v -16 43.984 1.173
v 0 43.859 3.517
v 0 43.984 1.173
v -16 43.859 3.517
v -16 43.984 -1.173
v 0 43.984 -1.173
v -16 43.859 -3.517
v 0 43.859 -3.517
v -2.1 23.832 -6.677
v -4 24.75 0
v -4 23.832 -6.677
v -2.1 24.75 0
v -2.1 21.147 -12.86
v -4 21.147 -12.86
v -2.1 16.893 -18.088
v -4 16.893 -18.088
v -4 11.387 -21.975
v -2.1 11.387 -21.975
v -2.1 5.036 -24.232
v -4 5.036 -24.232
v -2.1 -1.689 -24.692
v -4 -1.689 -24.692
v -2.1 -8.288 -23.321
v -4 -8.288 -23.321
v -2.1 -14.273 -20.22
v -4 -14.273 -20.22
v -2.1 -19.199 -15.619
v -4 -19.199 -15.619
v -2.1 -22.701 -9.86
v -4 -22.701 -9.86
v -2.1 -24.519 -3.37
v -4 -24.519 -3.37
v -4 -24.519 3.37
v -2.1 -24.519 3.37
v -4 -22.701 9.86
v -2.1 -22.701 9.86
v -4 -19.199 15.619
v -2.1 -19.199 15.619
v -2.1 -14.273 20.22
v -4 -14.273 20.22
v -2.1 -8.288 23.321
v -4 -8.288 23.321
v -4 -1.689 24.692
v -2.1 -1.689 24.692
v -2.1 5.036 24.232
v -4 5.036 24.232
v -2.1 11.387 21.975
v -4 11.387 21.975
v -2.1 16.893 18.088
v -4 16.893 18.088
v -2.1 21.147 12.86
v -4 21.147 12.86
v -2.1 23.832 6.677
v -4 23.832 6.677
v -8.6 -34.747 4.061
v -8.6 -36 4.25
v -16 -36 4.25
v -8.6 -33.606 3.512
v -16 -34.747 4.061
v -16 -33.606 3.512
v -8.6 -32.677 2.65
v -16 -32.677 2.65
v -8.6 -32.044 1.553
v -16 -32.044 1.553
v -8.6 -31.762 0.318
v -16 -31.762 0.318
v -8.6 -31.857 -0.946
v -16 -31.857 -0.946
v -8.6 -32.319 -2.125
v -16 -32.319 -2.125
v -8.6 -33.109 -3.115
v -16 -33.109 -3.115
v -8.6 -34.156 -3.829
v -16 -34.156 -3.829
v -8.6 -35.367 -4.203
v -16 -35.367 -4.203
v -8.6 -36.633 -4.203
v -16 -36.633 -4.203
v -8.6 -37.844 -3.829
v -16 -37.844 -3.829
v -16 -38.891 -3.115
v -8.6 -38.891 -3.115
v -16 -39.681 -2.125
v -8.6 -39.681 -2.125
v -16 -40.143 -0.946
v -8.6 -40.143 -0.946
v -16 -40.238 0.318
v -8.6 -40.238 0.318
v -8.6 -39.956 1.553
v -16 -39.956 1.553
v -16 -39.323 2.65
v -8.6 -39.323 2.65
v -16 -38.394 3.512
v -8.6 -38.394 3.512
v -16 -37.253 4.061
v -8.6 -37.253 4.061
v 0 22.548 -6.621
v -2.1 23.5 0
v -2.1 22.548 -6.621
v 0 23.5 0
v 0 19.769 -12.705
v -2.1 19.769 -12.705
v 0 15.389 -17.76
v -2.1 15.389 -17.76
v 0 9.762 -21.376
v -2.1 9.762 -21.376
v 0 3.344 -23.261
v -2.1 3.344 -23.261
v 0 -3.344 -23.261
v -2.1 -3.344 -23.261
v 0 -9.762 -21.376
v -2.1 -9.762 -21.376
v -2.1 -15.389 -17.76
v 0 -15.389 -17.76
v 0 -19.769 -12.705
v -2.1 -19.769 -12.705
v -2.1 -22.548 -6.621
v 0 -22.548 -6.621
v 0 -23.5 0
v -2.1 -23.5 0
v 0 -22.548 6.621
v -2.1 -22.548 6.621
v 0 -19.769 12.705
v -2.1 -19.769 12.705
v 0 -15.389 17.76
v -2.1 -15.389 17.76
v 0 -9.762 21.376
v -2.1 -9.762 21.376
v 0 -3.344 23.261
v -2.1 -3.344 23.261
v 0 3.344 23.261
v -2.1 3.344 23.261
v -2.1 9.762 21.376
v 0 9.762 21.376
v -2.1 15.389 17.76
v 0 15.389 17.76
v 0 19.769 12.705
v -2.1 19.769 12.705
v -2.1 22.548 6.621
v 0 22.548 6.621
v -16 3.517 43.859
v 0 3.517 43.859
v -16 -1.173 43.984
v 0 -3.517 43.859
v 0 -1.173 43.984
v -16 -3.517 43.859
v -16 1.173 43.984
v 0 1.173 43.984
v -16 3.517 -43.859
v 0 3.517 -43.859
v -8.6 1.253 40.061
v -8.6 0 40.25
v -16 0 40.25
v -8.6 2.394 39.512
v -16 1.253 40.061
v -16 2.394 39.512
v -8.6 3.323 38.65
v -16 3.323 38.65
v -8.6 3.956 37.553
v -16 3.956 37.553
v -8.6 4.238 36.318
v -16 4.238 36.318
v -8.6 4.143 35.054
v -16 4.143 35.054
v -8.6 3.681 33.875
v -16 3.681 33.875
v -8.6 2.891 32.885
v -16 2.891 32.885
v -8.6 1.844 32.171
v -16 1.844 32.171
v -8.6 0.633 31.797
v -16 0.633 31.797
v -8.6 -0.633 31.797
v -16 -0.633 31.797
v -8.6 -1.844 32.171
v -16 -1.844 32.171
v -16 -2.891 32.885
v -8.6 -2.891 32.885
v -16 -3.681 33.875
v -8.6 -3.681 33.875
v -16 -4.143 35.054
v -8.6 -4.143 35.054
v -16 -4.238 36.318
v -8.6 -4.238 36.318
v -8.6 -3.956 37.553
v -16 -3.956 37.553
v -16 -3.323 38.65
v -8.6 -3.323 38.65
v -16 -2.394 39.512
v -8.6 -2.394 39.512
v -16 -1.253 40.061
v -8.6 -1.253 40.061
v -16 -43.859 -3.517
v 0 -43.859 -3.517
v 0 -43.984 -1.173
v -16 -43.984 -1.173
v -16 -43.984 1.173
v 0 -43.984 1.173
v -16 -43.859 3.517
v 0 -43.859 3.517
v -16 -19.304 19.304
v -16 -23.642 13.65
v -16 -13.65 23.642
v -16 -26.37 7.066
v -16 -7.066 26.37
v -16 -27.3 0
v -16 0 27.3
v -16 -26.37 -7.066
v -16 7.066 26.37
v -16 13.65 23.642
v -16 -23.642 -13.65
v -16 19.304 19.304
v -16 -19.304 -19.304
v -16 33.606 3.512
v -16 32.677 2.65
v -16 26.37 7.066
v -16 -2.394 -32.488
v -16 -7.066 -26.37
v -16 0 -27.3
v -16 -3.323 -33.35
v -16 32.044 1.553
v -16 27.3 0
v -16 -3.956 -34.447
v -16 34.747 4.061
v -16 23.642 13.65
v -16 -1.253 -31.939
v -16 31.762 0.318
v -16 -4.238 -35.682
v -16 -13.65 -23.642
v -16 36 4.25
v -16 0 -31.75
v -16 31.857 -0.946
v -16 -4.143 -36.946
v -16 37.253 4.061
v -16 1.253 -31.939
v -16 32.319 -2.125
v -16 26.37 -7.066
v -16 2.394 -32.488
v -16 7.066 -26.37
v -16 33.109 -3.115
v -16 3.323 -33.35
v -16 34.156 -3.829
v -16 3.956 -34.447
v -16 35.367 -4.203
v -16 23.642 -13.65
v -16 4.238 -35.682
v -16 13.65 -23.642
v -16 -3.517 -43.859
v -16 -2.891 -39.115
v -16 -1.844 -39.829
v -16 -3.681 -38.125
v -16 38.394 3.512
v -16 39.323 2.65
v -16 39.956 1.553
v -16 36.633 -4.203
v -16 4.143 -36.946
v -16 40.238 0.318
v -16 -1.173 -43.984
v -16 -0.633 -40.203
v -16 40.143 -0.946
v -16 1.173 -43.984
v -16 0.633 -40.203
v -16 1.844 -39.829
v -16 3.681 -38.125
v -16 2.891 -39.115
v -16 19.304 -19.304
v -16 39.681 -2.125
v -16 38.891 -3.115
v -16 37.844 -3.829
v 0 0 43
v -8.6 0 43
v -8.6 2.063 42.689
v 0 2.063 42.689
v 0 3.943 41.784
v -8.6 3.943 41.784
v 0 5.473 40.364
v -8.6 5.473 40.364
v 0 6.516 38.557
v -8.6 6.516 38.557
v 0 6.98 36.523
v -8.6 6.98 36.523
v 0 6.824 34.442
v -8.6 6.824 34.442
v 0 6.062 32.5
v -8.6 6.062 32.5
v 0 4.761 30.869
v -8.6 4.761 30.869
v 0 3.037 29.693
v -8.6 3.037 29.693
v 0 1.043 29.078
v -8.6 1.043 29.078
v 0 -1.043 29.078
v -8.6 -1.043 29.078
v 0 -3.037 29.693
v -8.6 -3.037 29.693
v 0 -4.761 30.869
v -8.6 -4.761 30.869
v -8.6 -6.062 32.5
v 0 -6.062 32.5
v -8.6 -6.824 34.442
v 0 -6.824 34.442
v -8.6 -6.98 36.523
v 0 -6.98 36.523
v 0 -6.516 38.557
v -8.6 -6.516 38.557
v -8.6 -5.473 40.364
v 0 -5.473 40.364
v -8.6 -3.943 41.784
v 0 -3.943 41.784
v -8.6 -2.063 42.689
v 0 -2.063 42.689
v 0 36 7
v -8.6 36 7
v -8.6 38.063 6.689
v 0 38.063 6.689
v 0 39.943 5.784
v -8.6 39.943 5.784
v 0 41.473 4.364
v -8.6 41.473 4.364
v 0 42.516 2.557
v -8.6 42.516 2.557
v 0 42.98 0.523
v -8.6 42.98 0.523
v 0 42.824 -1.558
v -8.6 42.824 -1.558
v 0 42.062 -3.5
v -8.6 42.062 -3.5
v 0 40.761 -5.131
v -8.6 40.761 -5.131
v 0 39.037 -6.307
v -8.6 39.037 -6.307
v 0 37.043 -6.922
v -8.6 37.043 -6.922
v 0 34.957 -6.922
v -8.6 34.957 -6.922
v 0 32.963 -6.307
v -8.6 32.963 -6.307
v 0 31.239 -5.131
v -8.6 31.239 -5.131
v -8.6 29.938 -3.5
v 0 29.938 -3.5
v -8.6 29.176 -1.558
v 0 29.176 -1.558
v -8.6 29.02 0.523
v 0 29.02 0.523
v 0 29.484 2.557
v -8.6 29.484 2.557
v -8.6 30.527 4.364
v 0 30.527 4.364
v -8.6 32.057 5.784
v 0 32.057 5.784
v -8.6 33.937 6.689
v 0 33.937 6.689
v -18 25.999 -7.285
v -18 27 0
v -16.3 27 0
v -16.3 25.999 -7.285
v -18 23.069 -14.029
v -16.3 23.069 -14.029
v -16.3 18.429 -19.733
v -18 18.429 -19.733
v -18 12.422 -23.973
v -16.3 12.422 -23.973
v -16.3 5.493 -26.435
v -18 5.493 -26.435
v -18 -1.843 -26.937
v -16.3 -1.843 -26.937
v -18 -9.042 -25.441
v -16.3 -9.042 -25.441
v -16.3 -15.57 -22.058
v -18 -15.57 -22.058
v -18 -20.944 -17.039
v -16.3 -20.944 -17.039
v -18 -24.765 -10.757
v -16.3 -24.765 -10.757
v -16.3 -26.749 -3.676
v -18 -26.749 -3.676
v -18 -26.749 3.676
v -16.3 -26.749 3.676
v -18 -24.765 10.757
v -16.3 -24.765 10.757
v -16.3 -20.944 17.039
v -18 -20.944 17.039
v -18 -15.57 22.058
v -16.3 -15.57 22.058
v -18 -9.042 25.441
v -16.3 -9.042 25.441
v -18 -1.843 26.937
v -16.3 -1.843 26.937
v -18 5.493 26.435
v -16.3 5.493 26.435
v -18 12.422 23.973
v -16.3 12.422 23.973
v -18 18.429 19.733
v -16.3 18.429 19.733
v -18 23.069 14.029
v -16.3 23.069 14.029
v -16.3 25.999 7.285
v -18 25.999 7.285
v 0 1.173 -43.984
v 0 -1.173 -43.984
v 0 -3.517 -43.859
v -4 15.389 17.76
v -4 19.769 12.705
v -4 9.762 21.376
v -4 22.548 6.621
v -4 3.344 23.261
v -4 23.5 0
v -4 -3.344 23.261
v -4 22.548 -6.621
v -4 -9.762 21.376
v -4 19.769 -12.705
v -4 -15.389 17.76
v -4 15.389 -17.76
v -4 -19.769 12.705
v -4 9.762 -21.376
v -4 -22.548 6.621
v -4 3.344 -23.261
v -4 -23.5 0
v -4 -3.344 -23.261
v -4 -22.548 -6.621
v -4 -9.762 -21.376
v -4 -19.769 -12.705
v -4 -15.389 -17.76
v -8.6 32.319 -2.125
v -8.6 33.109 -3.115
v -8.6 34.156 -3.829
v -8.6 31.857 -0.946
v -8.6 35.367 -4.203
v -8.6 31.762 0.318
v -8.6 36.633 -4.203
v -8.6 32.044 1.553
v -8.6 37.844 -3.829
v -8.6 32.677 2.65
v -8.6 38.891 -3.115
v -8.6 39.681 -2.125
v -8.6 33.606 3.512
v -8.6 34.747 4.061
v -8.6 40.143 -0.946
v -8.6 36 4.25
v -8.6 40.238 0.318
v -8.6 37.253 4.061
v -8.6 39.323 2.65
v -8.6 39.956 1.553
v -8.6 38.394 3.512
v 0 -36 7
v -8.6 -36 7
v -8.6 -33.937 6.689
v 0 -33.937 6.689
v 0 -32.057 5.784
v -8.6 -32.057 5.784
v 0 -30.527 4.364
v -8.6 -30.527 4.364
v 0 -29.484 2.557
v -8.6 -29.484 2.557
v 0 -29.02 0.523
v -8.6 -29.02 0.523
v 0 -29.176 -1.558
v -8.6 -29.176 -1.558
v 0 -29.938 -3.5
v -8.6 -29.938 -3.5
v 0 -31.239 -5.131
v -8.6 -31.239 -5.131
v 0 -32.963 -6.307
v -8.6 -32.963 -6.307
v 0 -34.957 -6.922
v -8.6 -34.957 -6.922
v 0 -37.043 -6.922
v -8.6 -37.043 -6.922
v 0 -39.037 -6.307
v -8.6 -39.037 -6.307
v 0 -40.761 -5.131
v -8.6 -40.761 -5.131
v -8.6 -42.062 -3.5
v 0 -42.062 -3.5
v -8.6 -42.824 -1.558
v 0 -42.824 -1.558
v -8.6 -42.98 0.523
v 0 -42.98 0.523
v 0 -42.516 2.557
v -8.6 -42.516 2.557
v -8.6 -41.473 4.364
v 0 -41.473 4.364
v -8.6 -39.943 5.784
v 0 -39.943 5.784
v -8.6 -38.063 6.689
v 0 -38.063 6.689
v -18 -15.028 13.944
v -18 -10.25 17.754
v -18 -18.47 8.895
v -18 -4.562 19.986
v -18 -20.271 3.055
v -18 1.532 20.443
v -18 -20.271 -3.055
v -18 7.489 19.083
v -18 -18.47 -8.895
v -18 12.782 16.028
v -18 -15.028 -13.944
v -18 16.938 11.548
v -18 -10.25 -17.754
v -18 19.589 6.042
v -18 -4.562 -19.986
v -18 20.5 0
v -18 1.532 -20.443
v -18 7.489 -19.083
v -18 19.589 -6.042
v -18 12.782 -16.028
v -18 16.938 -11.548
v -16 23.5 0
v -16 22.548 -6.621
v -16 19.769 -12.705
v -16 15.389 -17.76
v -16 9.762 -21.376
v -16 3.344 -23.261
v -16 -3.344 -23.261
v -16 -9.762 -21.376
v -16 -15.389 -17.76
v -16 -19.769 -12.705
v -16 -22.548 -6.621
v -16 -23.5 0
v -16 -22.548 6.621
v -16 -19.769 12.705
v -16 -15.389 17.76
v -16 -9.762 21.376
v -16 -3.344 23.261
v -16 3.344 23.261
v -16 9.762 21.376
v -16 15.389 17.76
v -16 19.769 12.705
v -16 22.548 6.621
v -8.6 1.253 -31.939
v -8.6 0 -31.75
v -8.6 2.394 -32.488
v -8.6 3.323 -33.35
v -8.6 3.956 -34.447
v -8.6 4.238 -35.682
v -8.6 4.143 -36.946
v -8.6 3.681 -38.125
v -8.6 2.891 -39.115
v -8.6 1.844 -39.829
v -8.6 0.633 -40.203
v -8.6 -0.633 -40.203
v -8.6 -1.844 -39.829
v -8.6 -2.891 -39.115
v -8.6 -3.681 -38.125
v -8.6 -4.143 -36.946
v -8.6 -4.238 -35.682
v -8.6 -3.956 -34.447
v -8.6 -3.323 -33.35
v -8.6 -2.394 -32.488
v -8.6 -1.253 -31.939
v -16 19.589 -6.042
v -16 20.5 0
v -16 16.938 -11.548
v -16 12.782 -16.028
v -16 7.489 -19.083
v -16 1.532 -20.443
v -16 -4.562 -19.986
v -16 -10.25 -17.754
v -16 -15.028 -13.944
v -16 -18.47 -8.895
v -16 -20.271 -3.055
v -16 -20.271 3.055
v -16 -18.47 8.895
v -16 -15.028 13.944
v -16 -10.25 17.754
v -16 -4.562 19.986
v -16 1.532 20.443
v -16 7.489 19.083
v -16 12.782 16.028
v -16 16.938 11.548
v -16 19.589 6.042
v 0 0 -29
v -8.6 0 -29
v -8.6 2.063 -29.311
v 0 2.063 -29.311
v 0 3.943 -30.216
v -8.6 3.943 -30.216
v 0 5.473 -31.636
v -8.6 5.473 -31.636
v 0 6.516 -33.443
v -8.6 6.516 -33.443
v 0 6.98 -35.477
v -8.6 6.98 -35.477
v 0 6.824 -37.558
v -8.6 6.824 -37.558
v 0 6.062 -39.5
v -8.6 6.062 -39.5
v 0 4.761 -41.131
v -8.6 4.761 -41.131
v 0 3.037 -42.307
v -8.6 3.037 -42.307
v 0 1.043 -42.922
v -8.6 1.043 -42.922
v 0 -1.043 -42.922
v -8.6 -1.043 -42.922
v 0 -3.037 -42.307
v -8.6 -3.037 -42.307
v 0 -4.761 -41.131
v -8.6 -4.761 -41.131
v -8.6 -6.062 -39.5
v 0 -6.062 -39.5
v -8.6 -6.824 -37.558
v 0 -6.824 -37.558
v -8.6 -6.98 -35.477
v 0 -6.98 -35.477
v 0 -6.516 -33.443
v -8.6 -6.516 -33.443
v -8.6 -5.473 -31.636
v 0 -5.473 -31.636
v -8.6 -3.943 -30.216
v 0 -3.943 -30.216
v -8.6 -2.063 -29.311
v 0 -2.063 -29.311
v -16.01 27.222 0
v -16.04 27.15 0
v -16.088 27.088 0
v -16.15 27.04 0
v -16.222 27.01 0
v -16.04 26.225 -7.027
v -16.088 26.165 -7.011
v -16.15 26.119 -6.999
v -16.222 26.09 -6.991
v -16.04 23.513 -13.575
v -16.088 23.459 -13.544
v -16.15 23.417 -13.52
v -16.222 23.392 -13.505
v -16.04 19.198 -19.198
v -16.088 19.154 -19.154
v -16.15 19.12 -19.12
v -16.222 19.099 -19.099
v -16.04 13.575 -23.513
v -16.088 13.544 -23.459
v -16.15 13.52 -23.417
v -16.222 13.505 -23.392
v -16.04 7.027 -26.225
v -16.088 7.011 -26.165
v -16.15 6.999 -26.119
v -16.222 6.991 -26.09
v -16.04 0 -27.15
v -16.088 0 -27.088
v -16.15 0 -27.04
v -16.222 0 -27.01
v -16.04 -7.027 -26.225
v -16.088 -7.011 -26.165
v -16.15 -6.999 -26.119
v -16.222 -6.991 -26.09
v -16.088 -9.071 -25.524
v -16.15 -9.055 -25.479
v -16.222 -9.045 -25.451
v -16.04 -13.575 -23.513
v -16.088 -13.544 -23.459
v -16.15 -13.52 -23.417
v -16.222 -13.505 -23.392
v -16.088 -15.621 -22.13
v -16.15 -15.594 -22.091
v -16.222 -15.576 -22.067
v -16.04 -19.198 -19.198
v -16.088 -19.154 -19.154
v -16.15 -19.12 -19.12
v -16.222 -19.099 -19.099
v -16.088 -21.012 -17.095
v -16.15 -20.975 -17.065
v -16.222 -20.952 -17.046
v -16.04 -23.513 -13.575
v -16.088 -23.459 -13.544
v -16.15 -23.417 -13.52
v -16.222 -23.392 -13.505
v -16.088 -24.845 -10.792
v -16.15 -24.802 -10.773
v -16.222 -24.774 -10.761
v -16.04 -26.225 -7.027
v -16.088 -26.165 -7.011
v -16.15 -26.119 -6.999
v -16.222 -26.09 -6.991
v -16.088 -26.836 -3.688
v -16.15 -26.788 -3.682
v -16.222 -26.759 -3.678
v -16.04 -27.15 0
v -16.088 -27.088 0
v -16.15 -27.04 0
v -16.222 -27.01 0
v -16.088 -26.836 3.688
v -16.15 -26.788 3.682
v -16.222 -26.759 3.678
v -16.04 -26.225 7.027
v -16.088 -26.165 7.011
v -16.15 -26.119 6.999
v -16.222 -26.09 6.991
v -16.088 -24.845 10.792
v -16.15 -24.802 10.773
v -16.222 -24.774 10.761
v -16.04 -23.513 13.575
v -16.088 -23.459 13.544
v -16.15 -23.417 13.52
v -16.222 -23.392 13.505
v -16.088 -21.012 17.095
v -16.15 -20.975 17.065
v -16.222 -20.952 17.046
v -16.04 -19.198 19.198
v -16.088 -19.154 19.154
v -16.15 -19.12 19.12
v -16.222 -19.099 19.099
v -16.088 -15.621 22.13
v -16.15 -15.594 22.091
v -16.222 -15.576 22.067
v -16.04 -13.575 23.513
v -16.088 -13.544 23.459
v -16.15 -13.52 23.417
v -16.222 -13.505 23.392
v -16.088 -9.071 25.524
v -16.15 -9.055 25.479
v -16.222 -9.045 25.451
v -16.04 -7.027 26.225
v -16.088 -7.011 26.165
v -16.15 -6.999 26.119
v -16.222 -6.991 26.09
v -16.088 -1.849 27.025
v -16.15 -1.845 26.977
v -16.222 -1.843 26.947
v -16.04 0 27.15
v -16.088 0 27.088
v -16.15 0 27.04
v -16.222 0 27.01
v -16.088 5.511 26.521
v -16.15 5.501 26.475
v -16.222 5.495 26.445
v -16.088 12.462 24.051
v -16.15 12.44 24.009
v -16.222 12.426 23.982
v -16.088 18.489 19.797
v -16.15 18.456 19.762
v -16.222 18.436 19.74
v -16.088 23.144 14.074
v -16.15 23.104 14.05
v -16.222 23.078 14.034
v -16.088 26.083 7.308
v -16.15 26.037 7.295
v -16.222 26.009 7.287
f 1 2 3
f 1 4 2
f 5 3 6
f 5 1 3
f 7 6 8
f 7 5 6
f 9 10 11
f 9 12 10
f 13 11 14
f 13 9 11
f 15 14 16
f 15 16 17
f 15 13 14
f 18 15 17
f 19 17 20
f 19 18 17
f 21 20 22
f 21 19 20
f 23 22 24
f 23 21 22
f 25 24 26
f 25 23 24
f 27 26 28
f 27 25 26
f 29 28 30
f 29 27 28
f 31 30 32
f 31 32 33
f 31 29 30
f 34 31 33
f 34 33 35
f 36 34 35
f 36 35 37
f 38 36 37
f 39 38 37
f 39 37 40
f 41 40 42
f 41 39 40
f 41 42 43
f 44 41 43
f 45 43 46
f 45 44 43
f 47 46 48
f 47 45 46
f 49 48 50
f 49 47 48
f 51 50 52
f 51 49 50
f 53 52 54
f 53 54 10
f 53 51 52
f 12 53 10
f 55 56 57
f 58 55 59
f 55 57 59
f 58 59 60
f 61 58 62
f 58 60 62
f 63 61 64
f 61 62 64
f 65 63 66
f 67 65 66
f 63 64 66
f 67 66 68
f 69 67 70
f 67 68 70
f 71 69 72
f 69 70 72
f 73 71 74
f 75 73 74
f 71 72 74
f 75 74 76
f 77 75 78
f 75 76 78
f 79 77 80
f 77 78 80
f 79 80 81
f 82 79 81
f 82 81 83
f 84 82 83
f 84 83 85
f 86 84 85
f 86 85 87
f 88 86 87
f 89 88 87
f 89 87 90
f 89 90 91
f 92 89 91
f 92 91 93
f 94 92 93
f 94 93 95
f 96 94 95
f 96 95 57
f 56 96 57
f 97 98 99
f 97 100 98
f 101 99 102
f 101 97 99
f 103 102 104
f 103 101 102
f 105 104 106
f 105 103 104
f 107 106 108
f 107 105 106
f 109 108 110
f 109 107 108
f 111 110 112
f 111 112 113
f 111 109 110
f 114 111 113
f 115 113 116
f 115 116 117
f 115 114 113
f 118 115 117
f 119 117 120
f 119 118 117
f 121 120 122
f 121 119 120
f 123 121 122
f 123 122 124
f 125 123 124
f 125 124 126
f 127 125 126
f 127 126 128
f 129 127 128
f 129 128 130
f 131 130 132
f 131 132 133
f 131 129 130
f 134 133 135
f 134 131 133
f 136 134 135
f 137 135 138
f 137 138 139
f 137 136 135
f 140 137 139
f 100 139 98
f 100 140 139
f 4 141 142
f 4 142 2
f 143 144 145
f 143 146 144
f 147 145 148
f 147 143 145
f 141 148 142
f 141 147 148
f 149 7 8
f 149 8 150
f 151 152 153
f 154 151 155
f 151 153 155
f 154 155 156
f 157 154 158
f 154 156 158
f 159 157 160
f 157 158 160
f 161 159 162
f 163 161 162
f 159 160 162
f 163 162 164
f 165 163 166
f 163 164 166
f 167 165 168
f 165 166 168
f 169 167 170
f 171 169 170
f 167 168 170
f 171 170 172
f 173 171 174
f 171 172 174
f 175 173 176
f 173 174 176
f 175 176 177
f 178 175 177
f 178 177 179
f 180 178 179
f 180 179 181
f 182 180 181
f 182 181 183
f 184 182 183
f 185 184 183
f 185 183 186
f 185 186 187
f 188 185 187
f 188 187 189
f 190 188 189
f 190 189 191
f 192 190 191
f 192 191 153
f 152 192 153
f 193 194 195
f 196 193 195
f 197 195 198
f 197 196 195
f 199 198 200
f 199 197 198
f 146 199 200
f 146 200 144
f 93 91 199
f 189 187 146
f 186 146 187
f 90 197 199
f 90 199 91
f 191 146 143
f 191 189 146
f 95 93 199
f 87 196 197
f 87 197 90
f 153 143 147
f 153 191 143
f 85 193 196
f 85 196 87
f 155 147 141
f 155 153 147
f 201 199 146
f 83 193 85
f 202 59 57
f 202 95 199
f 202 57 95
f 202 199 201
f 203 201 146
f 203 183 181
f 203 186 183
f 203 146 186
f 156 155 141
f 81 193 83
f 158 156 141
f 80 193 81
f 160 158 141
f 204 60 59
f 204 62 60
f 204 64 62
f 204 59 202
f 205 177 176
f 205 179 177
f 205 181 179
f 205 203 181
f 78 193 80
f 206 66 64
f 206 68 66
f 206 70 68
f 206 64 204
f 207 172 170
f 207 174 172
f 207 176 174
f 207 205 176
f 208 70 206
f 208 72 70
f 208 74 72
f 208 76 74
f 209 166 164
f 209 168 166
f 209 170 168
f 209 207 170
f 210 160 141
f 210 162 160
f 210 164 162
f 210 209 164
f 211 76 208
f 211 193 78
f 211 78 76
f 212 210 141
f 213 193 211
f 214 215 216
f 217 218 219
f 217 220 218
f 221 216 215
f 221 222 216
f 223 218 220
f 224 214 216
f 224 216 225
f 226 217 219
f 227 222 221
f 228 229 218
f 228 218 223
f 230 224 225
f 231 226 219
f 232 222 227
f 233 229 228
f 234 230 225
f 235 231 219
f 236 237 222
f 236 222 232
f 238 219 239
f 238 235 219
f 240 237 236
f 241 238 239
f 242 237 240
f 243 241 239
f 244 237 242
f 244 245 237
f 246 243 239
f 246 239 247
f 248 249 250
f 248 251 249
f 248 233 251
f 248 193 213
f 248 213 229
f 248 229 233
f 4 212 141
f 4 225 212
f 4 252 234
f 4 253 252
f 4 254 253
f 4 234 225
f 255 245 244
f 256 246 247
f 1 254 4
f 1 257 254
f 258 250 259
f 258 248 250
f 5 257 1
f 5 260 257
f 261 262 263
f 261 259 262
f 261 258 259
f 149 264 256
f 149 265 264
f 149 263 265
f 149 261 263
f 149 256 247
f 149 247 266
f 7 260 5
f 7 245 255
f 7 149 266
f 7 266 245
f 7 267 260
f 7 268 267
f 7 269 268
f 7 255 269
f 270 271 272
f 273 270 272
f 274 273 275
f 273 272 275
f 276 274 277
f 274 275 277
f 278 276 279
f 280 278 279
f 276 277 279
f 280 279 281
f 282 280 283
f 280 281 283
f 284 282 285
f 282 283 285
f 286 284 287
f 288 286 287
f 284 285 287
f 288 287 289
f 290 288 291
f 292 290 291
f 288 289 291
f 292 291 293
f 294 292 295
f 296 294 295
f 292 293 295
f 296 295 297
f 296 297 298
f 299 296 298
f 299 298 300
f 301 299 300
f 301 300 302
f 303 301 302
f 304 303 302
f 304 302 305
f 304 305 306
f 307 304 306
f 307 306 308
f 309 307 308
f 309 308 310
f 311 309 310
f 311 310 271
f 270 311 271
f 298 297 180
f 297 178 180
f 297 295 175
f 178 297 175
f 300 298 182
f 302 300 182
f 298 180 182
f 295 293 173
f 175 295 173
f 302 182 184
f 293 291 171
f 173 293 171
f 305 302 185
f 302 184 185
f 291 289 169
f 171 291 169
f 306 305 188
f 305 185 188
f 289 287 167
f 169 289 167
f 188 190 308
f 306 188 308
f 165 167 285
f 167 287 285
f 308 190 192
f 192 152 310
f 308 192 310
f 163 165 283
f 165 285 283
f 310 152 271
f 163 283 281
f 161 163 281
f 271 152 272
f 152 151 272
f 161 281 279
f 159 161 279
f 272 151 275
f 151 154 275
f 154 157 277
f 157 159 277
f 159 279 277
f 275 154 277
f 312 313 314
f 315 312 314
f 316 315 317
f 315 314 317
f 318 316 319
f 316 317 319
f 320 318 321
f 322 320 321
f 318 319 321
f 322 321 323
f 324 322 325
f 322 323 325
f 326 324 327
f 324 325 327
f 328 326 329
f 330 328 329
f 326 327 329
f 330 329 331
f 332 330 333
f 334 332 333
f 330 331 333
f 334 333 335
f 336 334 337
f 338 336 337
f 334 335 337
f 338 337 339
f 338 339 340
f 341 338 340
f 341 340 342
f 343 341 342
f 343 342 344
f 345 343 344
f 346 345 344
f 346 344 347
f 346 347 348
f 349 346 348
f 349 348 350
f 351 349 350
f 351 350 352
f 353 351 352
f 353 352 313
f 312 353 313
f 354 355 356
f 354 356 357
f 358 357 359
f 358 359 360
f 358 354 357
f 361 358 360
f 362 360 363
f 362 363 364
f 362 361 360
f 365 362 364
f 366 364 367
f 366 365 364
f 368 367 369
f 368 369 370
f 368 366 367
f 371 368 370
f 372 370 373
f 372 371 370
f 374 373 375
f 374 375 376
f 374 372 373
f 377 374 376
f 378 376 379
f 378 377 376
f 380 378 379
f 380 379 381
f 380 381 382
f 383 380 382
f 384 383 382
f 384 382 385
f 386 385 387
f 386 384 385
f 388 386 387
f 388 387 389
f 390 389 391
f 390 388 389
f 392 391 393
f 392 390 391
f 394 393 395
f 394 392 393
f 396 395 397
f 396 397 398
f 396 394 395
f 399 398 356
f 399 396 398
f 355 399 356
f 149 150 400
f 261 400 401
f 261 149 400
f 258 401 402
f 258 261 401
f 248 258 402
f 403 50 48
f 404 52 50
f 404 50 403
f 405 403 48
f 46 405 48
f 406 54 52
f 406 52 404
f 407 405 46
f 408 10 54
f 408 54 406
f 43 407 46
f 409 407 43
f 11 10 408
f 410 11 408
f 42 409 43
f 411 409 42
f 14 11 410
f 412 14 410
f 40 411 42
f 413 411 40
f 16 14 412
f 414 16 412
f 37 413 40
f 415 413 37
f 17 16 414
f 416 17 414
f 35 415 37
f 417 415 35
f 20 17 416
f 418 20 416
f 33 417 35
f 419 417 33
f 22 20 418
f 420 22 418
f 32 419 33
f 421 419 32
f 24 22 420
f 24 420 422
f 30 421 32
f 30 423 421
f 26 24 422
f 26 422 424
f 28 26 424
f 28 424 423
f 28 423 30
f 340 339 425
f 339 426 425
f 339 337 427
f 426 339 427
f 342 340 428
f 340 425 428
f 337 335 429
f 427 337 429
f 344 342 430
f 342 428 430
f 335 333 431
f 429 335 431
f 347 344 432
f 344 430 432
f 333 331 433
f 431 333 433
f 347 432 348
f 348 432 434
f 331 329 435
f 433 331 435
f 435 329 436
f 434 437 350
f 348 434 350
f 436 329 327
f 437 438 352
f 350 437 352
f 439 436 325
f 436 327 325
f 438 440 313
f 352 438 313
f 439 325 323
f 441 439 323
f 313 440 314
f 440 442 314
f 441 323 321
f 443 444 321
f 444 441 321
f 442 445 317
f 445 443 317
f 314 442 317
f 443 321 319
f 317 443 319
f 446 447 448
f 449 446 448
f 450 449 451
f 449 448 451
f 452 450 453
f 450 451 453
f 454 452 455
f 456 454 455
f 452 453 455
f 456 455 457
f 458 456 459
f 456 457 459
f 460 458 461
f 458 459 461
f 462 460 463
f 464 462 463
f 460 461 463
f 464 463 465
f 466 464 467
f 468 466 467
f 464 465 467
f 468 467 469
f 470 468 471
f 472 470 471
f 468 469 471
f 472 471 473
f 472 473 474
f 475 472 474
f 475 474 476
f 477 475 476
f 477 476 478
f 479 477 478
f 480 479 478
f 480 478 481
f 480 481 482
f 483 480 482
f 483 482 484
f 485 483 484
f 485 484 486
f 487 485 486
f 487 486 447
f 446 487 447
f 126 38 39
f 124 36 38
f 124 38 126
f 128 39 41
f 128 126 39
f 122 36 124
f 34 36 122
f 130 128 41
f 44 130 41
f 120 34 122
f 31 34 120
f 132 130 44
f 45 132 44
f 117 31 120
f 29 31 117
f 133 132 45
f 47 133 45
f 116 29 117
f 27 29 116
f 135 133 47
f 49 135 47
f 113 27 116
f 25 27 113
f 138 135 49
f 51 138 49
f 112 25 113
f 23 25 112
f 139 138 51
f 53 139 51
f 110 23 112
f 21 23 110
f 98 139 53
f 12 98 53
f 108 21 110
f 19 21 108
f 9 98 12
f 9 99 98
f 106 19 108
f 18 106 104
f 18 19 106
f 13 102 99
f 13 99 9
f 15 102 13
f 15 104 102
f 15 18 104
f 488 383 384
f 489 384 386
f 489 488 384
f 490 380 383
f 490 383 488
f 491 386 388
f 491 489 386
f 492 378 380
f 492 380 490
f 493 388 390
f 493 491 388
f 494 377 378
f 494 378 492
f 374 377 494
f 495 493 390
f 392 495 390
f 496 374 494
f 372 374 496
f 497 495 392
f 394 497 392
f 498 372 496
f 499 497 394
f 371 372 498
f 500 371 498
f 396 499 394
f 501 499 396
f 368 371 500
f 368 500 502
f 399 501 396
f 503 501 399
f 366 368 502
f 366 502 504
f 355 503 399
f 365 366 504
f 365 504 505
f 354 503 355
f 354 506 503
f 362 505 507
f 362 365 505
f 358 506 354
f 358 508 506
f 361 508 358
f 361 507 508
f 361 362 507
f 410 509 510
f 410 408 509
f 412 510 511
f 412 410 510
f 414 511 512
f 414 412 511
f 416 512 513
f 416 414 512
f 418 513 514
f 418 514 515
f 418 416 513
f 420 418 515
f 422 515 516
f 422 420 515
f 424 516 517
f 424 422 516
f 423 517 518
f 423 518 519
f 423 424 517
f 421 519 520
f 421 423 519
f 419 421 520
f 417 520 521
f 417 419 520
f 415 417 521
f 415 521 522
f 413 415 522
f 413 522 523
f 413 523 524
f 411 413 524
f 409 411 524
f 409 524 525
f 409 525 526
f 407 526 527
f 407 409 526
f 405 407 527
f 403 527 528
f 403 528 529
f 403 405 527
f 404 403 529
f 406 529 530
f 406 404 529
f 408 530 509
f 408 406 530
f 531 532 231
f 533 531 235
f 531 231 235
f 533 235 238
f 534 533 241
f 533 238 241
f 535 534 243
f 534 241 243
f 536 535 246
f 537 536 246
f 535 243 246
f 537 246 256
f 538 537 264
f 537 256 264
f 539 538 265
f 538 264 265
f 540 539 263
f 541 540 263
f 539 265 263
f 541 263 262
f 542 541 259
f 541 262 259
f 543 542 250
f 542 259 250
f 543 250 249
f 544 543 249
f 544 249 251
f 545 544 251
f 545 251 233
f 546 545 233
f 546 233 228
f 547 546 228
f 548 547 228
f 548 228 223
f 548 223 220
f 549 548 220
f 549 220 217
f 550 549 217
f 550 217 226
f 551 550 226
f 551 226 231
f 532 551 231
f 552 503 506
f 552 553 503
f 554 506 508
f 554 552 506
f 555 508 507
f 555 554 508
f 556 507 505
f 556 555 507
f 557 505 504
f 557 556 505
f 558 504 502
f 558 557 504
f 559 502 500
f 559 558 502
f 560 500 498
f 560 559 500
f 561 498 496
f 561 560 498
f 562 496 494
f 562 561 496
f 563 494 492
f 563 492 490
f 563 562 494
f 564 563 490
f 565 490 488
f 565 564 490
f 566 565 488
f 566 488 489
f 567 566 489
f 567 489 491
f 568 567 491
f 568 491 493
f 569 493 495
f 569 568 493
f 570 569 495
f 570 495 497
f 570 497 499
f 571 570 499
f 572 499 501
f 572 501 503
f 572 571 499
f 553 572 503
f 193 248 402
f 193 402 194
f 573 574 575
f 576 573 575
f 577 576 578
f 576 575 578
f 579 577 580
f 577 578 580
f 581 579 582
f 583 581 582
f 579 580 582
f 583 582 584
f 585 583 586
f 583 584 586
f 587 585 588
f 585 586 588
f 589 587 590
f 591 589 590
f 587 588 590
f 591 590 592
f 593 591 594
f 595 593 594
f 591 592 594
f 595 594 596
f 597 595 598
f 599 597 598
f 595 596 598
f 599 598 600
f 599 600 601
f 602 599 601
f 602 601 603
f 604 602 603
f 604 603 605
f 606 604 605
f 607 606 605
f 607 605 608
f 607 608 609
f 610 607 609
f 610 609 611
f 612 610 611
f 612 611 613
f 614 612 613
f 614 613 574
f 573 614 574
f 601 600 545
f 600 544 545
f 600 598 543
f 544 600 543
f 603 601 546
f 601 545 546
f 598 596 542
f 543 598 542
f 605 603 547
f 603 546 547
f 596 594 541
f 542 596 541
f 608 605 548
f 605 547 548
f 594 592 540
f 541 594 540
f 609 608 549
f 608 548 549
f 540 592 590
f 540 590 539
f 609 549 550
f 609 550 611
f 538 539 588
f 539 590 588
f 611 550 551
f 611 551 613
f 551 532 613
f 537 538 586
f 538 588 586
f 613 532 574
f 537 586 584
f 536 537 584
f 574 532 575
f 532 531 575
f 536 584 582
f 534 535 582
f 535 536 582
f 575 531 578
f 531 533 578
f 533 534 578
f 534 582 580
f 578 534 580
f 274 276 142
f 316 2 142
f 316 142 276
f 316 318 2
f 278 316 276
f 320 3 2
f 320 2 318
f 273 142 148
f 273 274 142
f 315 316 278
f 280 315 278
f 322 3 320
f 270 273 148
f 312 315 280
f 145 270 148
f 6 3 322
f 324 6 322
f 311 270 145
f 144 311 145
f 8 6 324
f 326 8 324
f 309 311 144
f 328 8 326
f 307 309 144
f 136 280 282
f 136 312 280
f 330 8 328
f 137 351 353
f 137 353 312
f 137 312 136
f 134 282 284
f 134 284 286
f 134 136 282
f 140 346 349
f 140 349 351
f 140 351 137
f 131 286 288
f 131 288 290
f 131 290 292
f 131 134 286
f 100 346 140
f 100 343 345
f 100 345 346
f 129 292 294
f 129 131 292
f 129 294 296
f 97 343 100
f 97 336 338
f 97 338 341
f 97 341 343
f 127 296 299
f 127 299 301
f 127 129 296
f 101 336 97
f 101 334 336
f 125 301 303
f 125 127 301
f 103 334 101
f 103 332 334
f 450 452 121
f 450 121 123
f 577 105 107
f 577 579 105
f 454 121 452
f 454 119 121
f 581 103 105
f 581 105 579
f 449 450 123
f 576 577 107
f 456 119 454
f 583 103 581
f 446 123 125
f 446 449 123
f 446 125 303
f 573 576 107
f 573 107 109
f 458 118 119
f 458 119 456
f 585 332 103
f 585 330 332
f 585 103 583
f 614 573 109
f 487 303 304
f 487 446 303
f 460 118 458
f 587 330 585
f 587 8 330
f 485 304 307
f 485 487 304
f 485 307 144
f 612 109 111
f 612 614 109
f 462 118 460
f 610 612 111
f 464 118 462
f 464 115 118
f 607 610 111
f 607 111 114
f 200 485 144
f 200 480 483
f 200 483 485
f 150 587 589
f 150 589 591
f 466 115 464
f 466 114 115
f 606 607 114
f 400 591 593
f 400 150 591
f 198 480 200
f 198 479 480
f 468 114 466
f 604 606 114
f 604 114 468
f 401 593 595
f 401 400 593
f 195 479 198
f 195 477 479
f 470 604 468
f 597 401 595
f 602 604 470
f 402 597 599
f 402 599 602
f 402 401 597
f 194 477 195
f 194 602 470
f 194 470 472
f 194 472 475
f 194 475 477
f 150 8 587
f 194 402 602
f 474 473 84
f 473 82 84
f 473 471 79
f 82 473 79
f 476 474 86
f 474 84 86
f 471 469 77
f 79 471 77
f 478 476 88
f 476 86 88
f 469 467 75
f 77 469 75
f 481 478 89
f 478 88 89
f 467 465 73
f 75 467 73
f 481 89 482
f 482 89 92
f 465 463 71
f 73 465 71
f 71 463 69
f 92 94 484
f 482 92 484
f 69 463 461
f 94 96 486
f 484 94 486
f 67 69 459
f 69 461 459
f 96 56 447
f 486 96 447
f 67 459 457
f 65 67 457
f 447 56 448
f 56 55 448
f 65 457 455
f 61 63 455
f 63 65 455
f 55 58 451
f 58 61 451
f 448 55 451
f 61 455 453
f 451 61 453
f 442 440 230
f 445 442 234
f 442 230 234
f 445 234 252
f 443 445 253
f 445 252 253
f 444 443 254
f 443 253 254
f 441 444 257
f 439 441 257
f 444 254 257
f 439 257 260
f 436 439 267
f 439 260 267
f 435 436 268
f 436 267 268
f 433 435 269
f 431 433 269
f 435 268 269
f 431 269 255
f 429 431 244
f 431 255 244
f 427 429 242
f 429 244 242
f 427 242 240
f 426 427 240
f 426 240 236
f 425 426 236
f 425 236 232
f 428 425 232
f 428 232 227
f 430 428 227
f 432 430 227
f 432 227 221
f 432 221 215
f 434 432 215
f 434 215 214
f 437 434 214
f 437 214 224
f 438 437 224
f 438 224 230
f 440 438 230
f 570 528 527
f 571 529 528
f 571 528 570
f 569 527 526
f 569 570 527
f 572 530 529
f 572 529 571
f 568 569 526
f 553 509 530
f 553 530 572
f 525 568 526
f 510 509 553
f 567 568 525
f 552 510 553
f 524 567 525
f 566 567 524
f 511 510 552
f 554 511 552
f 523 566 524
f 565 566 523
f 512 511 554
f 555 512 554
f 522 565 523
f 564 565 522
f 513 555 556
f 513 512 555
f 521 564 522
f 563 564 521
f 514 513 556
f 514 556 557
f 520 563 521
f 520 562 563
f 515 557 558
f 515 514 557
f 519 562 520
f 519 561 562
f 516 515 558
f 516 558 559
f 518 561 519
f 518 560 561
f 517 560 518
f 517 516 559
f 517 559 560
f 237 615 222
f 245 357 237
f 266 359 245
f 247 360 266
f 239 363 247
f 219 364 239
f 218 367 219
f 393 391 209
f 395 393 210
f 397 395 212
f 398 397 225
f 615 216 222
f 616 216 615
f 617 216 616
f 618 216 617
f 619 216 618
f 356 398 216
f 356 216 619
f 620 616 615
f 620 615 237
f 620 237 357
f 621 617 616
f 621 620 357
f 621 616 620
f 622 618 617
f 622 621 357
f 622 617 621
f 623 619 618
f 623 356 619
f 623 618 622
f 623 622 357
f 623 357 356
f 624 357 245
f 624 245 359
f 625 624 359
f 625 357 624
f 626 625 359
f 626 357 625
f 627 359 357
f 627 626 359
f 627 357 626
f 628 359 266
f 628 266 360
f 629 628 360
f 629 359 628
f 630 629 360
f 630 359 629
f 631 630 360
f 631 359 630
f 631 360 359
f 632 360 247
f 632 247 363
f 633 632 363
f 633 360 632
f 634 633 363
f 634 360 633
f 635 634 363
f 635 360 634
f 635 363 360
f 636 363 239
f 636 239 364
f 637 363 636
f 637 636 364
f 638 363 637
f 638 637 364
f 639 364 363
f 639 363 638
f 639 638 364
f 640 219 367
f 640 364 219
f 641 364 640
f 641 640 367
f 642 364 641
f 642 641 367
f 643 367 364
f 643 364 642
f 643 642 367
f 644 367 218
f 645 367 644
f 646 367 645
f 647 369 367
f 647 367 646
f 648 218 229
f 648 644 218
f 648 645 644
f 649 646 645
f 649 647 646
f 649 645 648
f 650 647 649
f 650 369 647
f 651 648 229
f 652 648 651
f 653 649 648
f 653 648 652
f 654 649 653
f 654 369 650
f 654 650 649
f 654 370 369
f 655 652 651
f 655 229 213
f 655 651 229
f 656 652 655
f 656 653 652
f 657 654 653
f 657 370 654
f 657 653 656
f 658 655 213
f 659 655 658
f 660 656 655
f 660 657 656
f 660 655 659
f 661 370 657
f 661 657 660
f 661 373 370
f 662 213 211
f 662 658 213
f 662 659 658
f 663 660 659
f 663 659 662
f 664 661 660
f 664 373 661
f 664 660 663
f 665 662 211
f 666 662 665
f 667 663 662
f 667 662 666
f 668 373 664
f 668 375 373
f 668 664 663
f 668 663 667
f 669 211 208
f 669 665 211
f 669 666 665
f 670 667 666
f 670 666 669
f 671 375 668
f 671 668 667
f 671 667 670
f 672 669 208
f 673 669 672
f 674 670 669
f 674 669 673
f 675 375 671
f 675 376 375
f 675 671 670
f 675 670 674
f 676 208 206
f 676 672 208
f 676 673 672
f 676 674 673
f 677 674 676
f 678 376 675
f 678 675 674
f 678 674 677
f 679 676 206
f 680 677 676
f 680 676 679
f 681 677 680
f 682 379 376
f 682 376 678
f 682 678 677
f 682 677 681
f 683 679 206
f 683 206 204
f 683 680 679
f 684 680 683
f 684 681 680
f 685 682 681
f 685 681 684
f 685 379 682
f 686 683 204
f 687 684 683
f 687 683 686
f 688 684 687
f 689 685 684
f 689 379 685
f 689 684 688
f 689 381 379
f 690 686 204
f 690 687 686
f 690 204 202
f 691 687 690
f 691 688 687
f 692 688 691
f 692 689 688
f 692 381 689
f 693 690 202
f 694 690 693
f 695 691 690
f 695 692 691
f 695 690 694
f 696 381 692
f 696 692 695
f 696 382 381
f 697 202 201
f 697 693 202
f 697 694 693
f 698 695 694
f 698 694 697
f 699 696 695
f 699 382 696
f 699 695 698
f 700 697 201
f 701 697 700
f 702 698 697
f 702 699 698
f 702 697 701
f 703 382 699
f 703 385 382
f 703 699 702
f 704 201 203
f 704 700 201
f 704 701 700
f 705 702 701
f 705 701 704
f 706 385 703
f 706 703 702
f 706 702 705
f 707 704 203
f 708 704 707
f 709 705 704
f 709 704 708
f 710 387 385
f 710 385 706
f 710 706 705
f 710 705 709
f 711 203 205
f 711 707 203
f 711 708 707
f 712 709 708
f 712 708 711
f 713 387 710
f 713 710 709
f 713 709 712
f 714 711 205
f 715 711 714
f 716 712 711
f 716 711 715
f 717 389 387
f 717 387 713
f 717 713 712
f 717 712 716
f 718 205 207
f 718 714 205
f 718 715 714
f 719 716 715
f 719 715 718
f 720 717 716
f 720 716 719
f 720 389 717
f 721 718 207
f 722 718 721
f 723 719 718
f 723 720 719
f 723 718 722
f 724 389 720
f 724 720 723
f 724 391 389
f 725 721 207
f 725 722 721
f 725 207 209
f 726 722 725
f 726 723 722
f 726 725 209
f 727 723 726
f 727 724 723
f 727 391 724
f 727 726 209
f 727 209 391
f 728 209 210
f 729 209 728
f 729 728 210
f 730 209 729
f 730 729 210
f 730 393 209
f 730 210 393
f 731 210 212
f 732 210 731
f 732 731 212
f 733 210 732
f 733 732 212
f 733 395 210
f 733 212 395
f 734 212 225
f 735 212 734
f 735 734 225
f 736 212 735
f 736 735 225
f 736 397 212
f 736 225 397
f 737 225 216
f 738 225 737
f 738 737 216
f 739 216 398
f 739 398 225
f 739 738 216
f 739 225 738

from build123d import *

# Parameters (mm, degrees)
FILLET1_R            = 0.3
DIAMETER_HOLE1_D     = 14
DIAMETER_HOLE1_DEPTH = 8.6
TAPPED_HOLE1_D       = 8.5
CUT_EXTRUDE1_DEPTH   = 65.249513617


with BuildPart() as part:
    # Sketch1 → Revolve1 (revolve)
    with BuildSketch(Plane.XY):
        Polygon((0, 44), (-16, 44), (-16, 27), (-18, 27), (-18, 20.5), (-16, 20.5), (-16, 23.5), (-4, 23.5), (-4, 24.75), (-2.1, 24.75), (-2.1, 23.5), (0, 23.5), align=None)
    revolve(axis=Axis((0, 0, 0), (-1, 0, 0)))

    # Fillet1
    fillet1_edges = [part.edges().sort_by_distance(p)[0] for p in [
        (-16, -27, 0),
    ]]
    fillet(fillet1_edges, radius=FILLET1_R)

    # Diameter Hole1
    with Locations(Plane(origin=(0, 0, 0), x_dir=(0, 0, -1), z_dir=(1, 0, 0))):
        with Locations((0, 36), (-36, 0), (36, 0), (0, -36)):
            Hole(DIAMETER_HOLE1_D / 2, depth=DIAMETER_HOLE1_DEPTH)

    # Tapped Hole1 (through all)
    with Locations(Plane(origin=(-8.6, 0, 0), x_dir=(0, 0, -1), z_dir=(1, 0, 0))):
        with Locations((0, 36), (-36, 0), (0, -36), (36, 0)):
            Hole(TAPPED_HOLE1_D / 2)

    # Sketch6 → Cut-Extrude1 (cut, through all)
    with BuildSketch(Plane(origin=(-16, 0, 0), x_dir=(0, 0, -1), z_dir=(1, 0, 0))):
        with BuildLine():
            Line((-43.859219924, 3.516934416), (-3.516934416, 43.859219924))
            ThreePointArc((-3.516934416, 43.859219924), (-31.112698372, 31.112698372), (-43.859219924, 3.516934416))
        make_face()
        with BuildLine():
            Line((3.516934416, 43.859219924), (43.859219924, 3.516934416))
            ThreePointArc((43.859219924, 3.516934416), (31.112698372, 31.112698372), (3.516934416, 43.859219924))
        make_face()
        with BuildLine():
            Line((43.859219924, -3.516934416), (3.516934416, -43.859219924))
            ThreePointArc((3.516934416, -43.859219924), (31.112698372, -31.112698372), (43.859219924, -3.516934416))
        make_face()
        with BuildLine():
            Line((-3.516934416, -43.859219924), (-43.859219924, -3.516934416))
            ThreePointArc((-43.859219924, -3.516934416), (-31.112698372, -31.112698372), (-3.516934416, -43.859219924))
        make_face()
    extrude(amount=CUT_EXTRUDE1_DEPTH, mode=Mode.SUBTRACT)


solid = part.part
